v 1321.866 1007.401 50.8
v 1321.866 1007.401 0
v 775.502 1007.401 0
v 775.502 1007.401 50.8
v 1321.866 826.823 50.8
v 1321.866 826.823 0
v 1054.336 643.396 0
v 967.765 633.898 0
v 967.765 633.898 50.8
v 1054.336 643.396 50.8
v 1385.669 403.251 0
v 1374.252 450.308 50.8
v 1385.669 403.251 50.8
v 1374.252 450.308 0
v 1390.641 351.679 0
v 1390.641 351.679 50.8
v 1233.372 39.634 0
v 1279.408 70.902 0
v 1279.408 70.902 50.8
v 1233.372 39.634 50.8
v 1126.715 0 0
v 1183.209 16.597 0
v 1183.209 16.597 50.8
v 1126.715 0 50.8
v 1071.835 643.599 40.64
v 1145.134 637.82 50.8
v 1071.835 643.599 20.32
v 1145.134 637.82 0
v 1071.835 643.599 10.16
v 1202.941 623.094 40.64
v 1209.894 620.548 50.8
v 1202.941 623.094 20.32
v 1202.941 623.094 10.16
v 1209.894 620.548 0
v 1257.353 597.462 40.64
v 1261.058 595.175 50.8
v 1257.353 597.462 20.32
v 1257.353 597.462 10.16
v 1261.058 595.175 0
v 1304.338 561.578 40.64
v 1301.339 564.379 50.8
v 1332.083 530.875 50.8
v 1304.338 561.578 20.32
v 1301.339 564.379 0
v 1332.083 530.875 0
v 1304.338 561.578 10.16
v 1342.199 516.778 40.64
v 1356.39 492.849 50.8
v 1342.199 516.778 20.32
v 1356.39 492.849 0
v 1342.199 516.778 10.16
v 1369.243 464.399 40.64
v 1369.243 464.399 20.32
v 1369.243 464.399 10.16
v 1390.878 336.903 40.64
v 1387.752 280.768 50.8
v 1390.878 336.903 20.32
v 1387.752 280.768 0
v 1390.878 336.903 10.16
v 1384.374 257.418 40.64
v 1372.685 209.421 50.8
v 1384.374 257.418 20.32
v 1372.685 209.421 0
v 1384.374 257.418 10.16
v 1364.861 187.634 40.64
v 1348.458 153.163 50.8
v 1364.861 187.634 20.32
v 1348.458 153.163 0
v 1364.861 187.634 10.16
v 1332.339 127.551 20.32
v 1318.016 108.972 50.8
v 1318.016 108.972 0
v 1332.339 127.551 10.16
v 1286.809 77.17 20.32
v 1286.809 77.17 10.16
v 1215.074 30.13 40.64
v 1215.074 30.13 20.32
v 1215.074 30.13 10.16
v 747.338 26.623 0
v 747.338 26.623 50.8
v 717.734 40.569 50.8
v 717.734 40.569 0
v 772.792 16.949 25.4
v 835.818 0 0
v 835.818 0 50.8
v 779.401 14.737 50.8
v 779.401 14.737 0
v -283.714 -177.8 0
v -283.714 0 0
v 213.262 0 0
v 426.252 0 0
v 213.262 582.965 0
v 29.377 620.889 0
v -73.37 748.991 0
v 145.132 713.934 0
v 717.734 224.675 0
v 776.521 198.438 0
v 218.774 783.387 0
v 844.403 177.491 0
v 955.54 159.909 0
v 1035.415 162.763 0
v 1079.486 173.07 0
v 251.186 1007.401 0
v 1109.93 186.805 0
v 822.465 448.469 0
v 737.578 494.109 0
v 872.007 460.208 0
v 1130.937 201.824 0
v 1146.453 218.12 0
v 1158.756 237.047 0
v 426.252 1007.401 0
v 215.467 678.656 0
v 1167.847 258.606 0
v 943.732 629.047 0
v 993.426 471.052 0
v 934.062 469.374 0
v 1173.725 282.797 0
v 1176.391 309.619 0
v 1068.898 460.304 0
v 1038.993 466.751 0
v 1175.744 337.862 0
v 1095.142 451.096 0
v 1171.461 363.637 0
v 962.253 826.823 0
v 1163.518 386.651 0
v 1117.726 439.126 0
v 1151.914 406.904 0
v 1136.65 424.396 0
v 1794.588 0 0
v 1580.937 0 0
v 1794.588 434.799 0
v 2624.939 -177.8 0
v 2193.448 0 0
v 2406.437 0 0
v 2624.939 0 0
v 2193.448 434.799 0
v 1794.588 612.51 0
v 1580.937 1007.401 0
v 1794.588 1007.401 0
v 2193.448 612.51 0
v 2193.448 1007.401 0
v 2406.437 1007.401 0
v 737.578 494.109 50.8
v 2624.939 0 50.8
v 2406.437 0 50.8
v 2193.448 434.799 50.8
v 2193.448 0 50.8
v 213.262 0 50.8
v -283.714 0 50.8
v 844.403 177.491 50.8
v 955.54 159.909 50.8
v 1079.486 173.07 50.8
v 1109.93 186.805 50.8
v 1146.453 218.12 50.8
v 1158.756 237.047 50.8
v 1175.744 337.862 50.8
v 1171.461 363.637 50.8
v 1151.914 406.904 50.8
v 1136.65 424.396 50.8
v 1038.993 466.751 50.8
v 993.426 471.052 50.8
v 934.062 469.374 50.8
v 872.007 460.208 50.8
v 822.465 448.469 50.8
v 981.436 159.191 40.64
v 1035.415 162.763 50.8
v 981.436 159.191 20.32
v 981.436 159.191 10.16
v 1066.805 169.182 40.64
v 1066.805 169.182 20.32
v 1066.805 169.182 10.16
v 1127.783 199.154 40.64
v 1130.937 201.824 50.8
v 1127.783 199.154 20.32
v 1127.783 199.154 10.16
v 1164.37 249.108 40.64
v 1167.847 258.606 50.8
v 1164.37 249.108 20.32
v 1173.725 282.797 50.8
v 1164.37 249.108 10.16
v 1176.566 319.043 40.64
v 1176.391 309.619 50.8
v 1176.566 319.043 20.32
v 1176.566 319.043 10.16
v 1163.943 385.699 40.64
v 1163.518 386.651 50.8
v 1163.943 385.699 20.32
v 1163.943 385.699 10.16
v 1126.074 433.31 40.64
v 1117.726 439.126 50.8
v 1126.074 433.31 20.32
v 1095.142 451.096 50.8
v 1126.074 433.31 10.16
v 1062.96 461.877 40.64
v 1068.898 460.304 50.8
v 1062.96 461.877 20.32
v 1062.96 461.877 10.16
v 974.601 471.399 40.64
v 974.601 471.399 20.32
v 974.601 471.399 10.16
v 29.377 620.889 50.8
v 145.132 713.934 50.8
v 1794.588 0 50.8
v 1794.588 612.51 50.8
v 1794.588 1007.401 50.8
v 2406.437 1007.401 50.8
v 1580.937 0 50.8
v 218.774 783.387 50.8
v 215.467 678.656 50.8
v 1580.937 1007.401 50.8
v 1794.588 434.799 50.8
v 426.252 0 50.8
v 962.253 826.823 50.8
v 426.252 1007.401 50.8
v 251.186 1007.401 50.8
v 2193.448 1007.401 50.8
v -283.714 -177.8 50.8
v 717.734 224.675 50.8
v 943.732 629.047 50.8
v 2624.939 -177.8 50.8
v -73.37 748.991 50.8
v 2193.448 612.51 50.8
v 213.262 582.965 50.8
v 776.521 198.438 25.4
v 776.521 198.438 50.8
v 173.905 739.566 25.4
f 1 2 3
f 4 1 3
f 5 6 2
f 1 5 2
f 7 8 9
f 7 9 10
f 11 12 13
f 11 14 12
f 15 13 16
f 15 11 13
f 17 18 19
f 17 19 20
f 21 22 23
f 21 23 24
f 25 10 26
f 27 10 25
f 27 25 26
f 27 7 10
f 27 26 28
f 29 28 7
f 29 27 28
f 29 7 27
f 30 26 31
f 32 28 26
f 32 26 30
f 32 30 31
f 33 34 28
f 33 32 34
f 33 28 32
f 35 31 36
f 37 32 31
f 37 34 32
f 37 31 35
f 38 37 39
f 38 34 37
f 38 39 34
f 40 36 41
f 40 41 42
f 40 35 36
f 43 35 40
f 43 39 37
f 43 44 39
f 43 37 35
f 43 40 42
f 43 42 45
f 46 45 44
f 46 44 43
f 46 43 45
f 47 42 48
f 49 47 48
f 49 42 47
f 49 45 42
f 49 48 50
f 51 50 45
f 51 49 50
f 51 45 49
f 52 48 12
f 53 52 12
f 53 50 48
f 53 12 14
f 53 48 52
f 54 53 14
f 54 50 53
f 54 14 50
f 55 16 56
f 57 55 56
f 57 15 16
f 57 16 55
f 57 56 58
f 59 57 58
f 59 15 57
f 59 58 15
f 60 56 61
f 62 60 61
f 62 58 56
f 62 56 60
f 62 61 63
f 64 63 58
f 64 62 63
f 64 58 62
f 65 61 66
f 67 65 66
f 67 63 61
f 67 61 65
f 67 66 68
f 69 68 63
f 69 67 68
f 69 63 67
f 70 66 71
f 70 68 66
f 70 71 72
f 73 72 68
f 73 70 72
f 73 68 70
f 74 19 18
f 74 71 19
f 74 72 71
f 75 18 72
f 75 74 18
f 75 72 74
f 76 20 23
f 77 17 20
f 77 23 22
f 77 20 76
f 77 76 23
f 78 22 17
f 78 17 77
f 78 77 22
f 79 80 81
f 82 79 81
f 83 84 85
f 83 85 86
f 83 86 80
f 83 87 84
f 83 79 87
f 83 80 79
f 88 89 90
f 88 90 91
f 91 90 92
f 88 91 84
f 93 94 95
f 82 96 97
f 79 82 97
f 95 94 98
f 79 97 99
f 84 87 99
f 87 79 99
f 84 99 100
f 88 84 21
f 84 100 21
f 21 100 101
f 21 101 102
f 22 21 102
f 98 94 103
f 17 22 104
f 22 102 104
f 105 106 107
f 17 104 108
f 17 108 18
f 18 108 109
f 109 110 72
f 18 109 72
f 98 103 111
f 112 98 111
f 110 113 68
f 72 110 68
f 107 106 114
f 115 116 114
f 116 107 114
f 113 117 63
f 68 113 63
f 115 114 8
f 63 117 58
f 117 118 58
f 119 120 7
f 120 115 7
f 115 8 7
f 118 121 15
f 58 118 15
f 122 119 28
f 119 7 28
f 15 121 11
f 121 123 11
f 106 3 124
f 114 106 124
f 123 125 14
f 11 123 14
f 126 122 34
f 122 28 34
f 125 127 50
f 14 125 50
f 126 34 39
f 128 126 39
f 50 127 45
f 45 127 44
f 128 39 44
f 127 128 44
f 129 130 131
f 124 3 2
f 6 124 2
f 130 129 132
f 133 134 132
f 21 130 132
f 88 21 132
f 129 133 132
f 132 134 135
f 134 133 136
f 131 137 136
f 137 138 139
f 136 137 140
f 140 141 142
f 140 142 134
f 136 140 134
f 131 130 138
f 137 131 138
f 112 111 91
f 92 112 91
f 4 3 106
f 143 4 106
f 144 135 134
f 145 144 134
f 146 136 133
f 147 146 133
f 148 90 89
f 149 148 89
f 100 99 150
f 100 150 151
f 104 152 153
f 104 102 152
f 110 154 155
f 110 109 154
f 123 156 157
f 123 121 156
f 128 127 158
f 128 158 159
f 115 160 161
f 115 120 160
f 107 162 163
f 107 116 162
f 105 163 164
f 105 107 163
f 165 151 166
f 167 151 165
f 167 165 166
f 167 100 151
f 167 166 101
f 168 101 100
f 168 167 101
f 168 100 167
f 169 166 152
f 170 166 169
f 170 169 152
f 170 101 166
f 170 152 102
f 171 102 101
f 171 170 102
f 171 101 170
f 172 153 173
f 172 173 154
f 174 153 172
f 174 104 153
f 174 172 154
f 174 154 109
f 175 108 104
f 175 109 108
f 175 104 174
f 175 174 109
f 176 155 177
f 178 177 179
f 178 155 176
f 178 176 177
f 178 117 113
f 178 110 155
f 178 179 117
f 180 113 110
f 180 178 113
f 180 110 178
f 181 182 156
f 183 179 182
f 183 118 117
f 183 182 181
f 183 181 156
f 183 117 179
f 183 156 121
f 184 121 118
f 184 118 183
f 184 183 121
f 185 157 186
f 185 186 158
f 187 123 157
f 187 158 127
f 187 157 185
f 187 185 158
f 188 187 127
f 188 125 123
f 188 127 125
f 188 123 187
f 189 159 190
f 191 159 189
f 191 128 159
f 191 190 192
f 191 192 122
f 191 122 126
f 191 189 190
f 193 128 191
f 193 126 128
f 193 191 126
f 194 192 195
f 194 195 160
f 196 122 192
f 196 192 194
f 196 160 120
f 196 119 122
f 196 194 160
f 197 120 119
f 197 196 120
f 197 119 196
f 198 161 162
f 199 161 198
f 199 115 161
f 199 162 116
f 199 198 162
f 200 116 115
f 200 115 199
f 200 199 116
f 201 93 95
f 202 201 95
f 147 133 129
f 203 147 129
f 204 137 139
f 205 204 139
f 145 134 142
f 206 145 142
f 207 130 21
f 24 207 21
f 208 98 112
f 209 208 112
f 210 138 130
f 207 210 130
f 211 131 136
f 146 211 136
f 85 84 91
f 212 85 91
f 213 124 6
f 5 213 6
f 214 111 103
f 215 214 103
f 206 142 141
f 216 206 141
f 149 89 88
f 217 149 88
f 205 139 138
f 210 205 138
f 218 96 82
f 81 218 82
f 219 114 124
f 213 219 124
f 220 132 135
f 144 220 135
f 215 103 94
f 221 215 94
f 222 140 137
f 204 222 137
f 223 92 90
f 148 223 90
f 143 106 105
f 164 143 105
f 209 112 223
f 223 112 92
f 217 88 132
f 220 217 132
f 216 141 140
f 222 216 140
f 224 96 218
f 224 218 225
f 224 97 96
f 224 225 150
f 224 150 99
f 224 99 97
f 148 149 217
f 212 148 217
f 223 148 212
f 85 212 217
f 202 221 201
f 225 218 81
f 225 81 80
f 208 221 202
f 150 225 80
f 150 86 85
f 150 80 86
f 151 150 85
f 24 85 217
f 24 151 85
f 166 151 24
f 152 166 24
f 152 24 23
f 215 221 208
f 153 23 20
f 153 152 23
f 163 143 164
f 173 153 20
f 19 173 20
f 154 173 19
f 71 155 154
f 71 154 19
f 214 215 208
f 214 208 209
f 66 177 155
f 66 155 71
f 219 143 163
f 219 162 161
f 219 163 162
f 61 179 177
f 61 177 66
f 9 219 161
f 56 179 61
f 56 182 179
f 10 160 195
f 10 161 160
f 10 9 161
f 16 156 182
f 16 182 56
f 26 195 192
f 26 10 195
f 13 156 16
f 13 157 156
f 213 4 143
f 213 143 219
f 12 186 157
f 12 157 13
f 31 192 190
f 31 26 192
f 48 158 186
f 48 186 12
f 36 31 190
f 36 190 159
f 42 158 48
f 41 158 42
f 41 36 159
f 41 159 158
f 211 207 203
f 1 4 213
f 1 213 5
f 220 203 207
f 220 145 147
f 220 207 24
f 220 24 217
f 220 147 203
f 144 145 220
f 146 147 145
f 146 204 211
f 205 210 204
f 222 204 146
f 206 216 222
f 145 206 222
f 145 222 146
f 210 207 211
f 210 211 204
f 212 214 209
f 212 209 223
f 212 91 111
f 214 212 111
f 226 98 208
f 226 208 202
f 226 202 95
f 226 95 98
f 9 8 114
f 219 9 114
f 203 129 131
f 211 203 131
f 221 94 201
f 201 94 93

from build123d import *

# Parameters (mm, degrees)
F1_DEPTH = 50.8


# Not quite as in the source:
# - a feature names something its author has since deleted; it is built from what else it names


with BuildPart() as f1:
    # F0 (on Top) → F1 (new body)
    with BuildSketch(Plane.XY):
        with BuildLine():
            Line((-283.7137092352, 0), (-283.7137092352, -177.8))
            Line((-283.7137092352, -177.8), (2624.9390685426, -177.8))
            Line((2624.9390685426, -177.8), (2624.9390685426, 0))
            Line((2624.9390685426, 0), (2406.4373324315, 0))
            Line((2406.4373324315, 0), (2193.4477490981, 0))
            Line((2193.4477490981, 0), (1794.5883740981, 0))
            Line((1794.5883740981, 0), (1580.9373324315, 0))
            Line((1580.9373324315, 0), (1126.7145519045, 0))
            add(Edge.make_bspline(
                [(1126.7145519045, 0), (1064.7611763958, -13.890625), (989.1526102093, -13.890625)],
                knots=[0.6094332671, 0.6094332671, 0.6094332671, 1, 1, 1], degree=2))
            add(Edge.make_bspline(
                [(989.1526102093, -13.890625), (904.1900533476, -13.890625), (835.8175141984, 0)],
                knots=[0, 0, 0, 0.5050353738, 0.5050353738, 0.5050353738], degree=2))
            Line((835.8175141984, 0), (426.2515685426, 0))
            Line((426.2515685426, 0), (213.2619852093, 0))
            Line((213.2619852093, 0), (-283.7137092352, 0))
        make_face()
        with BuildLine():
            add(Edge.make_bspline(
                [(835.8175141984, 0), (768.808369802, 13.6136365267), (717.7342074315, 40.5694444444)],
                knots=[0.5050353738, 0.5050353738, 0.5050353738, 1, 1, 1], degree=2))
            Line((835.8175141984, 0), (1126.7145519045, 0))
            add(Edge.make_bspline(
                [(1286.8088602093, 77.1701388889), (1223.3854786806, 21.6746800513), (1126.7145519045, 0)],
                knots=[0, 0, 0, 0.6094332671, 0.6094332671, 0.6094332671], degree=2))
            add(Edge.make_bspline(
                [(1390.8783046537, 336.9027777778), (1390.8783046537, 168.2309027778), (1286.8088602093, 77.1701388889)],
                knots=[0, 0, 0, 1, 1, 1], degree=2))
            add(Edge.make_bspline(
                [(1304.3375060426, 561.578125), (1390.8783046537, 479.5572916667), (1390.8783046537, 336.9027777778)],
                knots=[0, 0, 0, 1, 1, 1], degree=2))
            add(Edge.make_bspline(
                [(1071.8349018759, 643.5989583333), (1217.7967074315, 643.5989583333), (1304.3375060426, 561.578125)],
                knots=[0, 0, 0, 1, 1, 1], degree=2))
            add(Edge.make_bspline(
                [(967.7654574315, 633.8975694444), (1009.8783046537, 643.5989583333), (1071.8349018759, 643.5989583333)],
                knots=[0, 0, 0, 1, 1, 1], degree=2))
            Line((967.7654574315, 633.8975694444), (943.7324713204, 629.046875))
            Line((943.7324713204, 629.046875), (962.2533046537, 826.8229166667))
            Line((962.2533046537, 826.8229166667), (1321.8661518759, 826.8229166667))
            Line((1321.8661518759, 826.8229166667), (1321.8661518759, 1007.4010416667))
            Line((1321.8661518759, 1007.4010416667), (775.5015685426, 1007.4010416667))
            Line((775.5015685426, 1007.4010416667), (737.5779574315, 494.109375))
            Line((737.5779574315, 494.109375), (822.4651102093, 448.46875))
            add(Edge.make_bspline(
                [(894.1230963204, 464.1232638889), (850.0258740981, 456.8472222222), (822.4651102093, 448.46875)],
                knots=[0, 0, 0, 1, 1, 1], degree=2))
            add(Edge.make_bspline(
                [(974.6005268759, 471.3993055556), (938.2203185426, 471.3993055556), (894.1230963204, 464.1232638889)],
                knots=[0, 0, 0, 1, 1, 1], degree=2))
            add(Edge.make_bspline(
                [(1176.5658046537, 319.0434027778), (1176.5658046537, 471.3993055556), (974.6005268759, 471.3993055556)],
                knots=[0, 0, 0, 1, 1, 1], degree=2))
            add(Edge.make_bspline(
                [(981.4355963204, 159.1909722222), (1176.5658046537, 159.1909722222), (1176.5658046537, 319.0434027778)],
                knots=[0, 0, 0, 1, 1, 1], degree=2))
            add(Edge.make_bspline(
                [(844.4034782648, 177.4913194444), (916.8331657648, 159.1909722222), (981.4355963204, 159.1909722222)],
                knots=[0, 0, 0, 1, 1, 1], degree=2))
            add(Edge.make_bspline(
                [(717.7342074315, 224.6753472222), (771.9737907648, 195.7916666667), (844.4034782648, 177.4913194444)],
                knots=[0, 0, 0, 1, 1, 1], degree=2))
            Line((717.7342074315, 224.6753472222), (717.7342074315, 40.5694444444))
        make_face()
        Polygon((2193.4477490981, 0), (2406.4373324315, 0), (2406.4373324315, 1007.4010416667), (2193.4477490981, 1007.4010416667), (2193.4477490981, 612.5104166667), (1794.5883740981, 612.5104166667), (1794.5883740981, 1007.4010416667), (1580.9373324315, 1007.4010416667), (1580.9373324315, 0), (1794.5883740981, 0), (1794.5883740981, 434.7986111111), (2193.4477490981, 434.7986111111), align=None)
        with BuildLine():
            Line((213.2619852093, 582.9652777778), (213.2619852093, 0))
            Line((213.2619852093, 0), (426.2515685426, 0))
            Line((426.2515685426, 0), (426.2515685426, 1007.4010416667))
            Line((426.2515685426, 1007.4010416667), (251.1855963204, 1007.4010416667))
            Line((251.1855963204, 1007.4010416667), (-73.3699592352, 748.9913194444))
            Line((-73.3699592352, 748.9913194444), (29.3765685426, 620.8888888889))
            Line((29.3765685426, 620.8888888889), (145.1317768759, 713.9340277778))
            add(Edge.make_bspline(
                [(218.774137987, 783.3871527778), (165.8574713204, 730.4704861111), (145.1317768759, 713.9340277778)],
                knots=[0, 0, 0, 1, 1, 1], degree=2))
            Line((218.774137987, 783.3871527778), (215.4668463204, 678.65625))
            Line((215.4668463204, 678.65625), (213.2619852093, 582.9652777778))
        make_face()
        with BuildLine():
            Line((1126.7145519045, 0), (835.8175141984, 0))
            add(Edge.make_bspline(
                [(989.1526102093, -13.890625), (904.1900533476, -13.890625), (835.8175141984, 0)],
                knots=[0, 0, 0, 0.5050353738, 0.5050353738, 0.5050353738], degree=2))
            add(Edge.make_bspline(
                [(1126.7145519045, 0), (1064.7611763958, -13.890625), (989.1526102093, -13.890625)],
                knots=[0.6094332671, 0.6094332671, 0.6094332671, 1, 1, 1], degree=2))
        make_face()
    extrude(amount=F1_DEPTH)


solid = f1.part
